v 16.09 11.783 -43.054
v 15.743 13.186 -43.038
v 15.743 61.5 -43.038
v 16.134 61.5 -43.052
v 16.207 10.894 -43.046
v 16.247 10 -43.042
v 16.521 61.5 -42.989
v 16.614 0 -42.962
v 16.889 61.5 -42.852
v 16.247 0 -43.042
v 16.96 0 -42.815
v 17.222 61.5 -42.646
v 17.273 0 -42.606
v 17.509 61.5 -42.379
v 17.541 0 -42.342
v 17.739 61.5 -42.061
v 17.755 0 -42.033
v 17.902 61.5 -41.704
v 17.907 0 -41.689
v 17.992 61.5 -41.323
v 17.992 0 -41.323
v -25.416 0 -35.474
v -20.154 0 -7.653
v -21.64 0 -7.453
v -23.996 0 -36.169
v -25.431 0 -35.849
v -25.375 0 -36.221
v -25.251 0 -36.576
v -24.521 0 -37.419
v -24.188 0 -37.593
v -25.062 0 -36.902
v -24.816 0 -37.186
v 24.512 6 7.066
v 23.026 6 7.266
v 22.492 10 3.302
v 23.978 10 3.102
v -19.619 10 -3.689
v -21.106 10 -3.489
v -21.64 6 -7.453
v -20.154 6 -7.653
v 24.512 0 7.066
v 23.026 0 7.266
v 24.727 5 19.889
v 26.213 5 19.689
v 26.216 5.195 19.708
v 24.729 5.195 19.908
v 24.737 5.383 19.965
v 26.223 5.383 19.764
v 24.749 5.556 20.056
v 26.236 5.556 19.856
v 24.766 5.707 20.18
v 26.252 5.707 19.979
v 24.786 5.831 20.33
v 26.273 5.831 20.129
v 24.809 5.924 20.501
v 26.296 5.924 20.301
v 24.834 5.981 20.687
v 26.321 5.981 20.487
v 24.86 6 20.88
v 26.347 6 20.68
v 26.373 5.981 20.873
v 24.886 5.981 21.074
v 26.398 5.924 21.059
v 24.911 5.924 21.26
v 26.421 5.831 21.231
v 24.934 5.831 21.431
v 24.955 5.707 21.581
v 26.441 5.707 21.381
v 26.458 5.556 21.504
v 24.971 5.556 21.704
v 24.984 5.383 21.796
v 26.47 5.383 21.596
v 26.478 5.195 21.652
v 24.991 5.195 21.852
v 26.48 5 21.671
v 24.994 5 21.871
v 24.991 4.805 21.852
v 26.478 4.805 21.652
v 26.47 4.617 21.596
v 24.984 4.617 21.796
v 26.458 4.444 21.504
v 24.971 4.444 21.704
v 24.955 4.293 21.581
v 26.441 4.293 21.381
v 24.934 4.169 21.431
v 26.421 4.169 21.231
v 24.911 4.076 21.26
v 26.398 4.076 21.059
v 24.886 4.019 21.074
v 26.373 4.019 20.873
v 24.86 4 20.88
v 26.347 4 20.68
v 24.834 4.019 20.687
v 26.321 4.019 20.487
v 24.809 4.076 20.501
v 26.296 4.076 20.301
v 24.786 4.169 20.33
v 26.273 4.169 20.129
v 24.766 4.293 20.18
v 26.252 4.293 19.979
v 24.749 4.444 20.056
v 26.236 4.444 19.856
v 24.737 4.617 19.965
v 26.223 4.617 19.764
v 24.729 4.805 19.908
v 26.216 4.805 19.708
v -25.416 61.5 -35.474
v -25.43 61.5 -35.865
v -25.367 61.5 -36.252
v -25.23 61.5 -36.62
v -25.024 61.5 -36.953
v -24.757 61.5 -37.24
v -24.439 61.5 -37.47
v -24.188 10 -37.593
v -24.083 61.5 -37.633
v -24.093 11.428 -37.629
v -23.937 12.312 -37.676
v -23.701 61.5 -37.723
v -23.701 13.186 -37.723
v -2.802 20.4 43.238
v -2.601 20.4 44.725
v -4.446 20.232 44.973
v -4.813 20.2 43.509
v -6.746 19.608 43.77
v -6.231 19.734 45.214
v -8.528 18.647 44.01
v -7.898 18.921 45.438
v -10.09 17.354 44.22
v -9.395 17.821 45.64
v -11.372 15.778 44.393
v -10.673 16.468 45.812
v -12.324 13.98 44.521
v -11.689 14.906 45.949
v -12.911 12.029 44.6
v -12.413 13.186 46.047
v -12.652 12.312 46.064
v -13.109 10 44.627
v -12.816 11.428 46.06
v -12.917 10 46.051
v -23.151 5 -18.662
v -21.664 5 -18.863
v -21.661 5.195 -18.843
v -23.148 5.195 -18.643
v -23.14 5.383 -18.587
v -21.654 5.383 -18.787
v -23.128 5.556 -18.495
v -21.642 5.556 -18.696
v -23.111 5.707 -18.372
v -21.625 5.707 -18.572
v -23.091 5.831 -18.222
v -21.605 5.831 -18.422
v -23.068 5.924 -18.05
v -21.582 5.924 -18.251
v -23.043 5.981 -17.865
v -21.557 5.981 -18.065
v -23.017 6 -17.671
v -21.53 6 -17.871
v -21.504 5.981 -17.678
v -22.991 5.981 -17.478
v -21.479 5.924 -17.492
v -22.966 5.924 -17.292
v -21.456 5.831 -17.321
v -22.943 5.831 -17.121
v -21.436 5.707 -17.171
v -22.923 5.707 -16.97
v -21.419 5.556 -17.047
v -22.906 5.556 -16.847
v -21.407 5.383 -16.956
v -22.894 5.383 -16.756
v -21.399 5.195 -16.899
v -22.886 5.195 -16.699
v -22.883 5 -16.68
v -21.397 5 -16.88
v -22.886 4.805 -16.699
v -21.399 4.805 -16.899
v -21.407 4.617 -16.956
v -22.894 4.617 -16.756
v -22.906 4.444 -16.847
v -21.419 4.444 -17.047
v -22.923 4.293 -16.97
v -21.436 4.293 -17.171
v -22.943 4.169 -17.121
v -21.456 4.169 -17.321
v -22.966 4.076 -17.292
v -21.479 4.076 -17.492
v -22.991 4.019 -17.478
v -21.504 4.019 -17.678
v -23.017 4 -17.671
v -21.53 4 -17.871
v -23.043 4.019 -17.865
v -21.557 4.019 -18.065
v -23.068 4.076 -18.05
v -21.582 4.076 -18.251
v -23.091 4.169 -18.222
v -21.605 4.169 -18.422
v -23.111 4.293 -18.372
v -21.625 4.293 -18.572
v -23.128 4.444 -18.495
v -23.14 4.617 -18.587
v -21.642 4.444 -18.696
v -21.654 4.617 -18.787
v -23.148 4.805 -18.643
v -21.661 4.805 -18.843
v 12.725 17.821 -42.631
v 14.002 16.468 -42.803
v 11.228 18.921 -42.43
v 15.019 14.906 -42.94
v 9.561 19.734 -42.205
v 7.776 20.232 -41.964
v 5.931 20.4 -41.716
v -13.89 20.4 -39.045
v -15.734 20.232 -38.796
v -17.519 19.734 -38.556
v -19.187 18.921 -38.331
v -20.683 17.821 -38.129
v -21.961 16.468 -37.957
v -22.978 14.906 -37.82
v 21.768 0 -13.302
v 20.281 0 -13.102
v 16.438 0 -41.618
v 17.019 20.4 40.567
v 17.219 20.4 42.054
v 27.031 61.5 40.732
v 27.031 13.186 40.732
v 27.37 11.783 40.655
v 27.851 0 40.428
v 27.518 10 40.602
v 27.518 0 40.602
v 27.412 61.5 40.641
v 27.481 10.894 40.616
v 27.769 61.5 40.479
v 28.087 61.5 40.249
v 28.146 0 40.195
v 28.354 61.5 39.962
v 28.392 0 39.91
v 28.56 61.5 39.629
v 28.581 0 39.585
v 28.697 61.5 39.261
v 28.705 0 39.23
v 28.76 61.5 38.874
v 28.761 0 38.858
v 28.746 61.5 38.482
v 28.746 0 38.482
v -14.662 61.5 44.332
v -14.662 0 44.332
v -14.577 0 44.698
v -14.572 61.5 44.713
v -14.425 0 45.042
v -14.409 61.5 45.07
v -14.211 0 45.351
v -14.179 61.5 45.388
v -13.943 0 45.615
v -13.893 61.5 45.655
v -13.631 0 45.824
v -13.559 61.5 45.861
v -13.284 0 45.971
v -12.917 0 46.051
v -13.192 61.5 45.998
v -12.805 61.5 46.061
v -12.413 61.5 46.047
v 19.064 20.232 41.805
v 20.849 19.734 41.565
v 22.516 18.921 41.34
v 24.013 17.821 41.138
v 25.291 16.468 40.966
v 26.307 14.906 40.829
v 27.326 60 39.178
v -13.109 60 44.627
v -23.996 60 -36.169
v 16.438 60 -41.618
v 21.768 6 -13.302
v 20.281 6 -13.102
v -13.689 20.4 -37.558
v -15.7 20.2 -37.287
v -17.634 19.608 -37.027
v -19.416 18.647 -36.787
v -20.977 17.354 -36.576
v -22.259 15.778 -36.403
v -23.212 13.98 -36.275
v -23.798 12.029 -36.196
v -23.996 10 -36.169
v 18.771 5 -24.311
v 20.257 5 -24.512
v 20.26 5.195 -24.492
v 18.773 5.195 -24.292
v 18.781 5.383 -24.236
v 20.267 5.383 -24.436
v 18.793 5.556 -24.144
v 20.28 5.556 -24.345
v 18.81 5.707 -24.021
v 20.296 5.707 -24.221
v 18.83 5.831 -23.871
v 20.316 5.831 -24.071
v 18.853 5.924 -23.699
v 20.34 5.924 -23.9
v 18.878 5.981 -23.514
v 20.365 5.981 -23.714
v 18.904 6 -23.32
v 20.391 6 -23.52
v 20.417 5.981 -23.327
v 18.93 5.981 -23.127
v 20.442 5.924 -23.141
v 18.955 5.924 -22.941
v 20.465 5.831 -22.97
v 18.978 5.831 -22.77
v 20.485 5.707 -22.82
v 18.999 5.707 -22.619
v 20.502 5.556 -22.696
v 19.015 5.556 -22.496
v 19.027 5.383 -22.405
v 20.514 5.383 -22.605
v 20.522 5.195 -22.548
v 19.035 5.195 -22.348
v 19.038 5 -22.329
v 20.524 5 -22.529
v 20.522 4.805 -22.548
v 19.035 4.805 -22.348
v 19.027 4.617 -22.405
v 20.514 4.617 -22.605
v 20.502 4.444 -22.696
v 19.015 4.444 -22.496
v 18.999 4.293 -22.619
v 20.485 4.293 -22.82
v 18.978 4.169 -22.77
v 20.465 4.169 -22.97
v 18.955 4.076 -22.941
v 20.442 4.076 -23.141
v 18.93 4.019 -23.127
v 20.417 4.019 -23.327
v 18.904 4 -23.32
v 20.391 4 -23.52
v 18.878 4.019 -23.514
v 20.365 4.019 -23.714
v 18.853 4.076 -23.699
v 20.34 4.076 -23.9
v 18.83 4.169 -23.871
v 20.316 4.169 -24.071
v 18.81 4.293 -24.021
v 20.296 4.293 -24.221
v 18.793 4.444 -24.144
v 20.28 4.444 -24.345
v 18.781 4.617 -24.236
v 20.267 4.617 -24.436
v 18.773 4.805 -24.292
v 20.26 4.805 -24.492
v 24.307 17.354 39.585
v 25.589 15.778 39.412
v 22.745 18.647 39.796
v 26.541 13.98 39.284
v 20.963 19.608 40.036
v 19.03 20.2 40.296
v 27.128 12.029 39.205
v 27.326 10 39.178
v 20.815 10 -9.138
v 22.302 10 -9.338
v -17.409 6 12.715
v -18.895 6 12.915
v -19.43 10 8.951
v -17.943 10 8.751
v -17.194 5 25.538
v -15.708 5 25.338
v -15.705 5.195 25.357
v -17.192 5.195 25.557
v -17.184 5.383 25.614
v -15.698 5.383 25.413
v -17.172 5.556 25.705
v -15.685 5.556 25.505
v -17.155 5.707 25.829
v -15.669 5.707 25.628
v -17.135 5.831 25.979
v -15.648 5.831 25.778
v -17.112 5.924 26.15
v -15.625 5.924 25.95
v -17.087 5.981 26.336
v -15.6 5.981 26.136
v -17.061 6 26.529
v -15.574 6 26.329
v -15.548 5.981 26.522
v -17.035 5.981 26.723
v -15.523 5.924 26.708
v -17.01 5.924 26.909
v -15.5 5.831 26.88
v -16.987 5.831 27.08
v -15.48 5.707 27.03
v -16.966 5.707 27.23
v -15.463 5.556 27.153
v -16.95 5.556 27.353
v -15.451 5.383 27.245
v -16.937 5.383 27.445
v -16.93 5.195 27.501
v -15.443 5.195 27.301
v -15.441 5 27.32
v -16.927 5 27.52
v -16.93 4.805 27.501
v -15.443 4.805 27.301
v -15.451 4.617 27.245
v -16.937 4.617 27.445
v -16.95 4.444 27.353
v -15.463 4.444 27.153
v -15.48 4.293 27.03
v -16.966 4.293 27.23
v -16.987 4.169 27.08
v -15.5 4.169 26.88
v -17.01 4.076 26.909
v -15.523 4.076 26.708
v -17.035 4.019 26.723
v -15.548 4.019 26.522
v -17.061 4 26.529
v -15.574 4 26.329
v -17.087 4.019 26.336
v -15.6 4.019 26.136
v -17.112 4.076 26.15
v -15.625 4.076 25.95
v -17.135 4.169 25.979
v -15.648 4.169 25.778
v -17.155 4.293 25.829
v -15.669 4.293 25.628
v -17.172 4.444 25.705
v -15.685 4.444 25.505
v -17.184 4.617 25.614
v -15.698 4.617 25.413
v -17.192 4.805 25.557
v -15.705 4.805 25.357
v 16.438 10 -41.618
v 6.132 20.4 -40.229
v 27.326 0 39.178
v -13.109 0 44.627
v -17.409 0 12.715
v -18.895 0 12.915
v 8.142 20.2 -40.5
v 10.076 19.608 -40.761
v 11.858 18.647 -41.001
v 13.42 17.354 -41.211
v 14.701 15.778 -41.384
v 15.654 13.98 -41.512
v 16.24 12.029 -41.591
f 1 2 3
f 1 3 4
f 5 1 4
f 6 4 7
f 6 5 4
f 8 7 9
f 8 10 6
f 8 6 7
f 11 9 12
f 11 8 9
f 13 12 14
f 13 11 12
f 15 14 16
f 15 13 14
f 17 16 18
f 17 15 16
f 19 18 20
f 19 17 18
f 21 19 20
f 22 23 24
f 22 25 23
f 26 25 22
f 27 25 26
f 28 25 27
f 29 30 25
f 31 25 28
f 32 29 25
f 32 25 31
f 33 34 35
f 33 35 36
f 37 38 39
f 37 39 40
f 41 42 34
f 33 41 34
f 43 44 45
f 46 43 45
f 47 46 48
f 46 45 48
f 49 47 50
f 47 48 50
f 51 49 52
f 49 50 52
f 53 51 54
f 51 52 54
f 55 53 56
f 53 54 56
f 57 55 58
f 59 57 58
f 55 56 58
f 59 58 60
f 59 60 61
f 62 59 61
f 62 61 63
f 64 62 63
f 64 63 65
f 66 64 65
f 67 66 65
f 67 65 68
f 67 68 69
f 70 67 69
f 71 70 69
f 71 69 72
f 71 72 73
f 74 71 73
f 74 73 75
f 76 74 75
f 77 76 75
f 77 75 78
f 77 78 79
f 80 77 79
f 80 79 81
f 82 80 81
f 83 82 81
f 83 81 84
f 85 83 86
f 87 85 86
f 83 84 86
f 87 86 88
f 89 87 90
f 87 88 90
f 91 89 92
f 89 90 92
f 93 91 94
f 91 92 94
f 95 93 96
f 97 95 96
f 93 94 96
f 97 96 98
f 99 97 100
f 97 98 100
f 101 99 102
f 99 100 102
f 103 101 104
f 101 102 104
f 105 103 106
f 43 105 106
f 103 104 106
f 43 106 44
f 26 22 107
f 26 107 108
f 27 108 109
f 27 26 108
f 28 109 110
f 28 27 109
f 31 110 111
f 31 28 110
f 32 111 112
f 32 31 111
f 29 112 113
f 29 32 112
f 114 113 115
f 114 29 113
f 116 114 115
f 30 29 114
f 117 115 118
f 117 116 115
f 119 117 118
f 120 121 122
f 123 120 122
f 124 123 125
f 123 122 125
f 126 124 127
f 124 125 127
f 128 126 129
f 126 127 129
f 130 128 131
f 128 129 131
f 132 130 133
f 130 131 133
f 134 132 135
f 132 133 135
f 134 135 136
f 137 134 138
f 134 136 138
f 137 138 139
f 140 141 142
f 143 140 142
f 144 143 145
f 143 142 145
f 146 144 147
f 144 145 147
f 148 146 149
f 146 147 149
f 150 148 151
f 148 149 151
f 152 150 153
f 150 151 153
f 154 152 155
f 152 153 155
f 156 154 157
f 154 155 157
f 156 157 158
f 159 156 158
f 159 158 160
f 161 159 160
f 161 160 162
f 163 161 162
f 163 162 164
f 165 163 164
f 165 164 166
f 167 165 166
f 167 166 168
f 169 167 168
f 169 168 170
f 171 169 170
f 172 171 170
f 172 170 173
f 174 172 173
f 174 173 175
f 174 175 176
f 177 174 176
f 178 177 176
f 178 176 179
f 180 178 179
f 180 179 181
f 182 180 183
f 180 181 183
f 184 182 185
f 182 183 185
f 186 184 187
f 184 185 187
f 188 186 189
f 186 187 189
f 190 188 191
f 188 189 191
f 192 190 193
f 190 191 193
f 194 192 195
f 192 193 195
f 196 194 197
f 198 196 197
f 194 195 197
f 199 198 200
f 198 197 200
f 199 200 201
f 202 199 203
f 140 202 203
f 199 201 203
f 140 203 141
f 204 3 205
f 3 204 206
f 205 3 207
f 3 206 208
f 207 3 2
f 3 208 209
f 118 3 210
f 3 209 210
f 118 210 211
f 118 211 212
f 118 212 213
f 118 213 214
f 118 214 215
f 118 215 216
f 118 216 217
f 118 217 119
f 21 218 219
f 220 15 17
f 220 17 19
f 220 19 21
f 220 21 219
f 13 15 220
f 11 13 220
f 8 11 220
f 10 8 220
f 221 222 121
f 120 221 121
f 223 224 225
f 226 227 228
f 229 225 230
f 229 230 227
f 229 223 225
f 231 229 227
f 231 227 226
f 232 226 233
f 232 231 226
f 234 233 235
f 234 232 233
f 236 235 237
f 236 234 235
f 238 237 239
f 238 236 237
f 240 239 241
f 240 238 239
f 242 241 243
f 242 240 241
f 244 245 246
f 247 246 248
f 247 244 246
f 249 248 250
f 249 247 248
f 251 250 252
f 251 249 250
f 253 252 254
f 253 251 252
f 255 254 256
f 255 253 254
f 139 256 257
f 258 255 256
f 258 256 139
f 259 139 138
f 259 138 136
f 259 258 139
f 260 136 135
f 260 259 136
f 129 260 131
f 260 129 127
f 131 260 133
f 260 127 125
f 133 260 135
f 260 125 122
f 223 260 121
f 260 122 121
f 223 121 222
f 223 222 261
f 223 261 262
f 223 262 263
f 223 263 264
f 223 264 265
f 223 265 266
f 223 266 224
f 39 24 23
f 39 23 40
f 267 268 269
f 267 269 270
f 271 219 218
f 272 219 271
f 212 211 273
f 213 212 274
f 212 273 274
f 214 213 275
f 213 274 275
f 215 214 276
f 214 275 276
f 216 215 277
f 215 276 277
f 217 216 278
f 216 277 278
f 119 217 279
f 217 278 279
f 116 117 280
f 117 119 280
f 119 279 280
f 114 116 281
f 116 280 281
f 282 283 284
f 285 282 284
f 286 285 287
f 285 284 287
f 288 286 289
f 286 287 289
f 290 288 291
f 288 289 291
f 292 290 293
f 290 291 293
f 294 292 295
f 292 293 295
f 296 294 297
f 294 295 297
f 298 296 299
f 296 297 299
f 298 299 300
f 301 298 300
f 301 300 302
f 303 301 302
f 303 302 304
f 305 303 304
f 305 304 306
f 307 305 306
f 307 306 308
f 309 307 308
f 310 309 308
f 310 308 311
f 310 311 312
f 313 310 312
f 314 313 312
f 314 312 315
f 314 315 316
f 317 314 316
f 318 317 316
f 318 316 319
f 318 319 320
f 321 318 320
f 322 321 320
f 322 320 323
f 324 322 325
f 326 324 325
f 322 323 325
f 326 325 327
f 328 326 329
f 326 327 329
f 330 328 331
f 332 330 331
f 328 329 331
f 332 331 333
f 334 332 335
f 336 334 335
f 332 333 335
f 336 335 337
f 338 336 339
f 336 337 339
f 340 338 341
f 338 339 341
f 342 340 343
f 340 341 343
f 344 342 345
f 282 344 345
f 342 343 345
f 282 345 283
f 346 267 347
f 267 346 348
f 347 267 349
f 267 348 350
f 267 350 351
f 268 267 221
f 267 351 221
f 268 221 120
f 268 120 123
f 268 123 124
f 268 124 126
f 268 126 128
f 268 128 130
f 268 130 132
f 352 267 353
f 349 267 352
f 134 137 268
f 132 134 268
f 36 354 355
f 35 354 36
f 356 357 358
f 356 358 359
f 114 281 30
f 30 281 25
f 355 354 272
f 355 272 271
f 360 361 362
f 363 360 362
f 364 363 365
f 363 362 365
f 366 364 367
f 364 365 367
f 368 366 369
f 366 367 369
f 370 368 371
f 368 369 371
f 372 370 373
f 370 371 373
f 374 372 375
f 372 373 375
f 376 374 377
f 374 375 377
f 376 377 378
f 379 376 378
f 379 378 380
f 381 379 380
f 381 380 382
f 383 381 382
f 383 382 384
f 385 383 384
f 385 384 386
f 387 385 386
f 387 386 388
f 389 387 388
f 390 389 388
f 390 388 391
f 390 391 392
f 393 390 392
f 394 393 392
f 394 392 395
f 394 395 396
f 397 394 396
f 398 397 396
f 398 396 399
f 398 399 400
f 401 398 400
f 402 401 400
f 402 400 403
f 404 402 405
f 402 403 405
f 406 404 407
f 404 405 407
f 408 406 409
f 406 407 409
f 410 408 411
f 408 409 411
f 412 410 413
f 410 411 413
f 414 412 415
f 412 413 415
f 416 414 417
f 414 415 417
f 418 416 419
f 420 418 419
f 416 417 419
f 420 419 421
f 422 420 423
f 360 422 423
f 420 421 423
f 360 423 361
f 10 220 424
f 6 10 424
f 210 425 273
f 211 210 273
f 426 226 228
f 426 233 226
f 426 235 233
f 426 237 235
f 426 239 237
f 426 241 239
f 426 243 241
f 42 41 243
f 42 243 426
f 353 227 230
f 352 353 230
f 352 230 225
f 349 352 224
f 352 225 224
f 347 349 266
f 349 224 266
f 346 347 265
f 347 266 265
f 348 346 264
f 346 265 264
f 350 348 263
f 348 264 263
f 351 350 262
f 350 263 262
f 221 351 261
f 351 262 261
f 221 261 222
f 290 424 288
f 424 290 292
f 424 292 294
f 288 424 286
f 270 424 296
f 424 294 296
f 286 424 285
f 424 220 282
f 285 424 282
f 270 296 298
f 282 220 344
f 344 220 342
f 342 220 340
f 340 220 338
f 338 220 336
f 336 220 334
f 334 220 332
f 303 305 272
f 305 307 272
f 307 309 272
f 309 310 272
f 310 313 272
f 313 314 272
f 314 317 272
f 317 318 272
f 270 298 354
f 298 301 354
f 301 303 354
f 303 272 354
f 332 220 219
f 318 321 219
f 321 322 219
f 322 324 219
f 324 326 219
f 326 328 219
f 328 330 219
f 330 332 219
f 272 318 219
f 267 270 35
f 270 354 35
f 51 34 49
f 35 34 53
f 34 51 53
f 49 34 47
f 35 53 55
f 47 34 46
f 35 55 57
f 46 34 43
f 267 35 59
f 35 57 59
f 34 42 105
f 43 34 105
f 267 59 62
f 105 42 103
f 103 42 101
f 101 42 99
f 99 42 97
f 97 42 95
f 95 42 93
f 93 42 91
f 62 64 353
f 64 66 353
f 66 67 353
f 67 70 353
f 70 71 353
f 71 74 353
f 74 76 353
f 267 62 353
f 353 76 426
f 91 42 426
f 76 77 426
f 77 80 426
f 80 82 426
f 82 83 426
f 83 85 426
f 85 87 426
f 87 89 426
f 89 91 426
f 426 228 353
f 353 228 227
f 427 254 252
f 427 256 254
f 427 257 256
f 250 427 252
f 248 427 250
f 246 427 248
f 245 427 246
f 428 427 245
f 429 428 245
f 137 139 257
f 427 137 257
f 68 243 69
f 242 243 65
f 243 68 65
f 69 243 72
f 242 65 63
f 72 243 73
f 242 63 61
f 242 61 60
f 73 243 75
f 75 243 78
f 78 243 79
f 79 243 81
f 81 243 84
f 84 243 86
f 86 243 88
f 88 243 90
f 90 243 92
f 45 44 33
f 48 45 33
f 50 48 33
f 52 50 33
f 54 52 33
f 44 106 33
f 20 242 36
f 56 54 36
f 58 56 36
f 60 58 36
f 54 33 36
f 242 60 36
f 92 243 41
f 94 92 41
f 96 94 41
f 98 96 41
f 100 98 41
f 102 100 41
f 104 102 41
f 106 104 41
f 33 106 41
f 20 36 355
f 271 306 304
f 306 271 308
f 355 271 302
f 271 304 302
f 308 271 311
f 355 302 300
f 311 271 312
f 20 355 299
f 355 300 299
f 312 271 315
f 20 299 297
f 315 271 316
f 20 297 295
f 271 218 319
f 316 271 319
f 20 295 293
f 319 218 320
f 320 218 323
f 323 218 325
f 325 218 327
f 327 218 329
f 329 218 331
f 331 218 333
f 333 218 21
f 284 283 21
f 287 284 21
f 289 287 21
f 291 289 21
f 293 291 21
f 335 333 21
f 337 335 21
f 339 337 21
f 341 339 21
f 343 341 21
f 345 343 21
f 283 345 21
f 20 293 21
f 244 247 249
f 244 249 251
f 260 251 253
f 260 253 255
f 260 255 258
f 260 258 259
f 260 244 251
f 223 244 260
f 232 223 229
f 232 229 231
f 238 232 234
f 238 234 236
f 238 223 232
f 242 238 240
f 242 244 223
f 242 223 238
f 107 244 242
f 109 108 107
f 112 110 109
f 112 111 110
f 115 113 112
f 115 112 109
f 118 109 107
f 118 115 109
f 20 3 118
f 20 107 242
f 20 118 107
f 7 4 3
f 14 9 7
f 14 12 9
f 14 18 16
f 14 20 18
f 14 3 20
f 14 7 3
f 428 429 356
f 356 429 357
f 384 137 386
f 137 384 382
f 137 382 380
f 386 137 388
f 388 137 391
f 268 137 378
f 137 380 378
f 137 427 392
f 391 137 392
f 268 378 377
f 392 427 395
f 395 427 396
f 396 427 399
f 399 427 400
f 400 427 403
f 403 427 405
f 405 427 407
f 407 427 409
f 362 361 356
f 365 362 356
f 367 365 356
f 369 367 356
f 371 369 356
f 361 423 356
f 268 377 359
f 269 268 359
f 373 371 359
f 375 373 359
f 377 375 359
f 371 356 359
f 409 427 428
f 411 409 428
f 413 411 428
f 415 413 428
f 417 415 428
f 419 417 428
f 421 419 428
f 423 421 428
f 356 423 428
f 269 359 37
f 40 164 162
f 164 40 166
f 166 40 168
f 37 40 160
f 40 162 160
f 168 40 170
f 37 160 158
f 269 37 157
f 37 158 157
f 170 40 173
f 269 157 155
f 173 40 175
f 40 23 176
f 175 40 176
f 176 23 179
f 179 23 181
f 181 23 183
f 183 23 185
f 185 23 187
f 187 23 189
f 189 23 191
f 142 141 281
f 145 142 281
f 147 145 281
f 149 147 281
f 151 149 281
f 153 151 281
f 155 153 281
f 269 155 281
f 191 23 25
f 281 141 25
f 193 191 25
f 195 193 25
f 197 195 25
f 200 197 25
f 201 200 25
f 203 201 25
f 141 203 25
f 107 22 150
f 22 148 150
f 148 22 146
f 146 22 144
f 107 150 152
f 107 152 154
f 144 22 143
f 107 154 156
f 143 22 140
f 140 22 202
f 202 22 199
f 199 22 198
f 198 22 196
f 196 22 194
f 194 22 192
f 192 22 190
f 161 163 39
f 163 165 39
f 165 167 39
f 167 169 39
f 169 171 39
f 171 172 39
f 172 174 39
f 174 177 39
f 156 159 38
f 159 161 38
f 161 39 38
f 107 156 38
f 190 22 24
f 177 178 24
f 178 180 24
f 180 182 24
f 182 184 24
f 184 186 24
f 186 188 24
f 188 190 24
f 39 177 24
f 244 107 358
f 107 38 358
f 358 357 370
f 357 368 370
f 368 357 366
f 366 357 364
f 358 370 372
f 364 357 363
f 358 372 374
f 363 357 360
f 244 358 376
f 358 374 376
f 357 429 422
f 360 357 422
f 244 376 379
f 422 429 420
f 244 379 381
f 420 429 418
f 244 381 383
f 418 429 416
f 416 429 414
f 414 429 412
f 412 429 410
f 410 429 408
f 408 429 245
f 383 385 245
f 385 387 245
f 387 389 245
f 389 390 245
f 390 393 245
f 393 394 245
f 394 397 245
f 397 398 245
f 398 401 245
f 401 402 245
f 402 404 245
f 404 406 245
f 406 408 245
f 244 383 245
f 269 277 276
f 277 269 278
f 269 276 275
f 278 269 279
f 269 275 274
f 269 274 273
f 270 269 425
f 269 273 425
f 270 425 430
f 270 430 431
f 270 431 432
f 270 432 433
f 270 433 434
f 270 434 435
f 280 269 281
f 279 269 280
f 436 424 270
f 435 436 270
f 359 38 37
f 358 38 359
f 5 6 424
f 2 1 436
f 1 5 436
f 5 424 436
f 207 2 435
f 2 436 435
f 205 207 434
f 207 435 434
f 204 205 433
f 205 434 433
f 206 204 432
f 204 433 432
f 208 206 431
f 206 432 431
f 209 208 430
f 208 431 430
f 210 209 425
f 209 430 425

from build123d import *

# Parameters (mm, degrees)
BOSS_EXTRUDE1_DEPTH = 60
BOSS_EXTRUDE2_DEPTH = 1.5
CUT_EXTRUDE1_DEPTH  = 122.5
FILLET1_R           = 2
SKETCH4_R           = 1
CUT_EXTRUDE2_DEPTH  = 122.5
SKETCH5_W           = 20.552185026
SKETCH5_H           = 10
CUT_EXTRUDE3_DEPTH  = 66.5
CHAMFER2_SIZE       = 4


with BuildPart() as part:
    # Sketch1 → Boss-Extrude1 (new body)
    with BuildSketch(Plane(origin=(0, 0, 0), x_dir=(1, 0, 0), z_dir=(0, 1, 0))):
        Polygon((-25.683056898, 37.455662838), (17.724607753, 43.304991821), (29.01282847, -40.464497095), (-14.394836181, -46.313826078), align=None)
        Polygon((-23.996173554, 36.169418466), (16.438363381, 41.618108478), (27.325945127, -39.178252723), (-13.108591809, -44.626942734), align=None, mode=Mode.SUBTRACT)
    extrude(amount=BOSS_EXTRUDE1_DEPTH)

    # Sketch2 → Boss-Extrude2 (add)
    with BuildSketch(Plane(origin=(0, 60, 0), x_dir=(1, 0, 0), z_dir=(0, 1, 0))):
        Polygon((-25.683056898, 37.455662838), (-14.394836181, -46.313826078), (29.01282847, -40.464497095), (17.724607753, 43.304991821), align=None)
    extrude(amount=BOSS_EXTRUDE2_DEPTH)

    # Sketch3 → Cut-Extrude1 (cut)
    with BuildSketch(Plane(origin=(5.87291271, 0, 43.582678665), x_dir=(0.991042572, 0, -0.133546324), z_dir=(0.133546324, 0, 0.991042572))):
        with BuildLine():
            Line((21.449063315, 0), (21.449063315, 10))
            ThreePointArc((21.449063315, 10), (18.520131127, 17.071067812), (11.449063315, 20))
            Line((11.449063315, 20), (-8.550936685, 20))
            ThreePointArc((-8.550936685, 20), (-15.622004497, 17.071067812), (-18.550936685, 10))
            Line((-18.550936685, 10), (-18.550936685, 0))
            Line((-18.550936685, 0), (21.449063315, 0))
        make_face()
        with BuildLine():
            ThreePointArc((11.449063315, 20), (18.520131127, 17.071067812), (21.449063315, 10))
            Line((21.449063315, 10), (21.449063315, 0))
            Line((21.449063315, 0), (21.849063315, 0))
            Line((21.849063315, 0), (21.849063315, 10))
            ThreePointArc((21.849063315, 10), (18.802973839, 17.353910524), (11.449063315, 20.4))
            Line((11.449063315, 20.4), (-8.550936685, 20.4))
            ThreePointArc((-8.550936685, 20.4), (-15.90484721, 17.353910524), (-18.950936685, 10))
            Line((-18.950936685, 10), (-18.950936685, 0))
            Line((-18.950936685, 0), (-18.550936685, 0))
            Line((-18.550936685, 0), (-18.550936685, 10))
            ThreePointArc((-18.550936685, 10), (-15.622004497, 17.071067812), (-8.550936685, 20))
            Line((-8.550936685, 20), (11.449063315, 20))
        make_face()
    extrude(amount=-CUT_EXTRUDE1_DEPTH, mode=Mode.SUBTRACT)

    # Fillet1
    fillet1_edges = [part.edges().sort_by_distance(p)[0] for p in [
        (17.724607753, 30.75, -43.304991821),
        (-25.683056898, 30.75, -37.455662838),
        (-14.394836181, 30.75, 46.313826078),
        (29.01282847, 30.75, 40.464497095),
    ]]
    fillet(fillet1_edges, radius=FILLET1_R)

    # Sketch4 → Cut-Extrude2 (cut)
    with BuildSketch(Plane(origin=(23.13991576, 0, -3.11818157), x_dir=(-0.133546324, 0, -0.991042572), z_dir=(0.991042572, 0, -0.133546324))):
        with Locations((-24.013280796, 5)):
            Circle(SKETCH4_R)
        with Locations((20.586719204, 5)):
            Circle(SKETCH4_R)
    extrude(amount=-CUT_EXTRUDE2_DEPTH, mode=Mode.SUBTRACT)

    # Sketch5 → Cut-Extrude3 (cut)
    with BuildSketch(Plane(origin=(-20.267748891, 0, 2.731147413), x_dir=(0.133546324, 0, 0.991042572), z_dir=(-0.991042572, 0, 0.133546324))):
        with Locations((0, 5)):
            Rectangle(SKETCH5_W, SKETCH5_H)
    extrude(amount=-CUT_EXTRUDE3_DEPTH, mode=Mode.SUBTRACT)

    # Chamfer2
    chamfer2_edges = [part.edges().sort_by_distance(p)[0] for p in [
        (21.024299453, 10, -13.202066981),
        (-20.89680134, 10, -7.553057484),
        (23.768968209, 10, 7.166023327),
        (-18.152132584, 10, 12.815032824),
    ]]
    chamfer(chamfer2_edges, length=CHAMFER2_SIZE)


solid = part.part
